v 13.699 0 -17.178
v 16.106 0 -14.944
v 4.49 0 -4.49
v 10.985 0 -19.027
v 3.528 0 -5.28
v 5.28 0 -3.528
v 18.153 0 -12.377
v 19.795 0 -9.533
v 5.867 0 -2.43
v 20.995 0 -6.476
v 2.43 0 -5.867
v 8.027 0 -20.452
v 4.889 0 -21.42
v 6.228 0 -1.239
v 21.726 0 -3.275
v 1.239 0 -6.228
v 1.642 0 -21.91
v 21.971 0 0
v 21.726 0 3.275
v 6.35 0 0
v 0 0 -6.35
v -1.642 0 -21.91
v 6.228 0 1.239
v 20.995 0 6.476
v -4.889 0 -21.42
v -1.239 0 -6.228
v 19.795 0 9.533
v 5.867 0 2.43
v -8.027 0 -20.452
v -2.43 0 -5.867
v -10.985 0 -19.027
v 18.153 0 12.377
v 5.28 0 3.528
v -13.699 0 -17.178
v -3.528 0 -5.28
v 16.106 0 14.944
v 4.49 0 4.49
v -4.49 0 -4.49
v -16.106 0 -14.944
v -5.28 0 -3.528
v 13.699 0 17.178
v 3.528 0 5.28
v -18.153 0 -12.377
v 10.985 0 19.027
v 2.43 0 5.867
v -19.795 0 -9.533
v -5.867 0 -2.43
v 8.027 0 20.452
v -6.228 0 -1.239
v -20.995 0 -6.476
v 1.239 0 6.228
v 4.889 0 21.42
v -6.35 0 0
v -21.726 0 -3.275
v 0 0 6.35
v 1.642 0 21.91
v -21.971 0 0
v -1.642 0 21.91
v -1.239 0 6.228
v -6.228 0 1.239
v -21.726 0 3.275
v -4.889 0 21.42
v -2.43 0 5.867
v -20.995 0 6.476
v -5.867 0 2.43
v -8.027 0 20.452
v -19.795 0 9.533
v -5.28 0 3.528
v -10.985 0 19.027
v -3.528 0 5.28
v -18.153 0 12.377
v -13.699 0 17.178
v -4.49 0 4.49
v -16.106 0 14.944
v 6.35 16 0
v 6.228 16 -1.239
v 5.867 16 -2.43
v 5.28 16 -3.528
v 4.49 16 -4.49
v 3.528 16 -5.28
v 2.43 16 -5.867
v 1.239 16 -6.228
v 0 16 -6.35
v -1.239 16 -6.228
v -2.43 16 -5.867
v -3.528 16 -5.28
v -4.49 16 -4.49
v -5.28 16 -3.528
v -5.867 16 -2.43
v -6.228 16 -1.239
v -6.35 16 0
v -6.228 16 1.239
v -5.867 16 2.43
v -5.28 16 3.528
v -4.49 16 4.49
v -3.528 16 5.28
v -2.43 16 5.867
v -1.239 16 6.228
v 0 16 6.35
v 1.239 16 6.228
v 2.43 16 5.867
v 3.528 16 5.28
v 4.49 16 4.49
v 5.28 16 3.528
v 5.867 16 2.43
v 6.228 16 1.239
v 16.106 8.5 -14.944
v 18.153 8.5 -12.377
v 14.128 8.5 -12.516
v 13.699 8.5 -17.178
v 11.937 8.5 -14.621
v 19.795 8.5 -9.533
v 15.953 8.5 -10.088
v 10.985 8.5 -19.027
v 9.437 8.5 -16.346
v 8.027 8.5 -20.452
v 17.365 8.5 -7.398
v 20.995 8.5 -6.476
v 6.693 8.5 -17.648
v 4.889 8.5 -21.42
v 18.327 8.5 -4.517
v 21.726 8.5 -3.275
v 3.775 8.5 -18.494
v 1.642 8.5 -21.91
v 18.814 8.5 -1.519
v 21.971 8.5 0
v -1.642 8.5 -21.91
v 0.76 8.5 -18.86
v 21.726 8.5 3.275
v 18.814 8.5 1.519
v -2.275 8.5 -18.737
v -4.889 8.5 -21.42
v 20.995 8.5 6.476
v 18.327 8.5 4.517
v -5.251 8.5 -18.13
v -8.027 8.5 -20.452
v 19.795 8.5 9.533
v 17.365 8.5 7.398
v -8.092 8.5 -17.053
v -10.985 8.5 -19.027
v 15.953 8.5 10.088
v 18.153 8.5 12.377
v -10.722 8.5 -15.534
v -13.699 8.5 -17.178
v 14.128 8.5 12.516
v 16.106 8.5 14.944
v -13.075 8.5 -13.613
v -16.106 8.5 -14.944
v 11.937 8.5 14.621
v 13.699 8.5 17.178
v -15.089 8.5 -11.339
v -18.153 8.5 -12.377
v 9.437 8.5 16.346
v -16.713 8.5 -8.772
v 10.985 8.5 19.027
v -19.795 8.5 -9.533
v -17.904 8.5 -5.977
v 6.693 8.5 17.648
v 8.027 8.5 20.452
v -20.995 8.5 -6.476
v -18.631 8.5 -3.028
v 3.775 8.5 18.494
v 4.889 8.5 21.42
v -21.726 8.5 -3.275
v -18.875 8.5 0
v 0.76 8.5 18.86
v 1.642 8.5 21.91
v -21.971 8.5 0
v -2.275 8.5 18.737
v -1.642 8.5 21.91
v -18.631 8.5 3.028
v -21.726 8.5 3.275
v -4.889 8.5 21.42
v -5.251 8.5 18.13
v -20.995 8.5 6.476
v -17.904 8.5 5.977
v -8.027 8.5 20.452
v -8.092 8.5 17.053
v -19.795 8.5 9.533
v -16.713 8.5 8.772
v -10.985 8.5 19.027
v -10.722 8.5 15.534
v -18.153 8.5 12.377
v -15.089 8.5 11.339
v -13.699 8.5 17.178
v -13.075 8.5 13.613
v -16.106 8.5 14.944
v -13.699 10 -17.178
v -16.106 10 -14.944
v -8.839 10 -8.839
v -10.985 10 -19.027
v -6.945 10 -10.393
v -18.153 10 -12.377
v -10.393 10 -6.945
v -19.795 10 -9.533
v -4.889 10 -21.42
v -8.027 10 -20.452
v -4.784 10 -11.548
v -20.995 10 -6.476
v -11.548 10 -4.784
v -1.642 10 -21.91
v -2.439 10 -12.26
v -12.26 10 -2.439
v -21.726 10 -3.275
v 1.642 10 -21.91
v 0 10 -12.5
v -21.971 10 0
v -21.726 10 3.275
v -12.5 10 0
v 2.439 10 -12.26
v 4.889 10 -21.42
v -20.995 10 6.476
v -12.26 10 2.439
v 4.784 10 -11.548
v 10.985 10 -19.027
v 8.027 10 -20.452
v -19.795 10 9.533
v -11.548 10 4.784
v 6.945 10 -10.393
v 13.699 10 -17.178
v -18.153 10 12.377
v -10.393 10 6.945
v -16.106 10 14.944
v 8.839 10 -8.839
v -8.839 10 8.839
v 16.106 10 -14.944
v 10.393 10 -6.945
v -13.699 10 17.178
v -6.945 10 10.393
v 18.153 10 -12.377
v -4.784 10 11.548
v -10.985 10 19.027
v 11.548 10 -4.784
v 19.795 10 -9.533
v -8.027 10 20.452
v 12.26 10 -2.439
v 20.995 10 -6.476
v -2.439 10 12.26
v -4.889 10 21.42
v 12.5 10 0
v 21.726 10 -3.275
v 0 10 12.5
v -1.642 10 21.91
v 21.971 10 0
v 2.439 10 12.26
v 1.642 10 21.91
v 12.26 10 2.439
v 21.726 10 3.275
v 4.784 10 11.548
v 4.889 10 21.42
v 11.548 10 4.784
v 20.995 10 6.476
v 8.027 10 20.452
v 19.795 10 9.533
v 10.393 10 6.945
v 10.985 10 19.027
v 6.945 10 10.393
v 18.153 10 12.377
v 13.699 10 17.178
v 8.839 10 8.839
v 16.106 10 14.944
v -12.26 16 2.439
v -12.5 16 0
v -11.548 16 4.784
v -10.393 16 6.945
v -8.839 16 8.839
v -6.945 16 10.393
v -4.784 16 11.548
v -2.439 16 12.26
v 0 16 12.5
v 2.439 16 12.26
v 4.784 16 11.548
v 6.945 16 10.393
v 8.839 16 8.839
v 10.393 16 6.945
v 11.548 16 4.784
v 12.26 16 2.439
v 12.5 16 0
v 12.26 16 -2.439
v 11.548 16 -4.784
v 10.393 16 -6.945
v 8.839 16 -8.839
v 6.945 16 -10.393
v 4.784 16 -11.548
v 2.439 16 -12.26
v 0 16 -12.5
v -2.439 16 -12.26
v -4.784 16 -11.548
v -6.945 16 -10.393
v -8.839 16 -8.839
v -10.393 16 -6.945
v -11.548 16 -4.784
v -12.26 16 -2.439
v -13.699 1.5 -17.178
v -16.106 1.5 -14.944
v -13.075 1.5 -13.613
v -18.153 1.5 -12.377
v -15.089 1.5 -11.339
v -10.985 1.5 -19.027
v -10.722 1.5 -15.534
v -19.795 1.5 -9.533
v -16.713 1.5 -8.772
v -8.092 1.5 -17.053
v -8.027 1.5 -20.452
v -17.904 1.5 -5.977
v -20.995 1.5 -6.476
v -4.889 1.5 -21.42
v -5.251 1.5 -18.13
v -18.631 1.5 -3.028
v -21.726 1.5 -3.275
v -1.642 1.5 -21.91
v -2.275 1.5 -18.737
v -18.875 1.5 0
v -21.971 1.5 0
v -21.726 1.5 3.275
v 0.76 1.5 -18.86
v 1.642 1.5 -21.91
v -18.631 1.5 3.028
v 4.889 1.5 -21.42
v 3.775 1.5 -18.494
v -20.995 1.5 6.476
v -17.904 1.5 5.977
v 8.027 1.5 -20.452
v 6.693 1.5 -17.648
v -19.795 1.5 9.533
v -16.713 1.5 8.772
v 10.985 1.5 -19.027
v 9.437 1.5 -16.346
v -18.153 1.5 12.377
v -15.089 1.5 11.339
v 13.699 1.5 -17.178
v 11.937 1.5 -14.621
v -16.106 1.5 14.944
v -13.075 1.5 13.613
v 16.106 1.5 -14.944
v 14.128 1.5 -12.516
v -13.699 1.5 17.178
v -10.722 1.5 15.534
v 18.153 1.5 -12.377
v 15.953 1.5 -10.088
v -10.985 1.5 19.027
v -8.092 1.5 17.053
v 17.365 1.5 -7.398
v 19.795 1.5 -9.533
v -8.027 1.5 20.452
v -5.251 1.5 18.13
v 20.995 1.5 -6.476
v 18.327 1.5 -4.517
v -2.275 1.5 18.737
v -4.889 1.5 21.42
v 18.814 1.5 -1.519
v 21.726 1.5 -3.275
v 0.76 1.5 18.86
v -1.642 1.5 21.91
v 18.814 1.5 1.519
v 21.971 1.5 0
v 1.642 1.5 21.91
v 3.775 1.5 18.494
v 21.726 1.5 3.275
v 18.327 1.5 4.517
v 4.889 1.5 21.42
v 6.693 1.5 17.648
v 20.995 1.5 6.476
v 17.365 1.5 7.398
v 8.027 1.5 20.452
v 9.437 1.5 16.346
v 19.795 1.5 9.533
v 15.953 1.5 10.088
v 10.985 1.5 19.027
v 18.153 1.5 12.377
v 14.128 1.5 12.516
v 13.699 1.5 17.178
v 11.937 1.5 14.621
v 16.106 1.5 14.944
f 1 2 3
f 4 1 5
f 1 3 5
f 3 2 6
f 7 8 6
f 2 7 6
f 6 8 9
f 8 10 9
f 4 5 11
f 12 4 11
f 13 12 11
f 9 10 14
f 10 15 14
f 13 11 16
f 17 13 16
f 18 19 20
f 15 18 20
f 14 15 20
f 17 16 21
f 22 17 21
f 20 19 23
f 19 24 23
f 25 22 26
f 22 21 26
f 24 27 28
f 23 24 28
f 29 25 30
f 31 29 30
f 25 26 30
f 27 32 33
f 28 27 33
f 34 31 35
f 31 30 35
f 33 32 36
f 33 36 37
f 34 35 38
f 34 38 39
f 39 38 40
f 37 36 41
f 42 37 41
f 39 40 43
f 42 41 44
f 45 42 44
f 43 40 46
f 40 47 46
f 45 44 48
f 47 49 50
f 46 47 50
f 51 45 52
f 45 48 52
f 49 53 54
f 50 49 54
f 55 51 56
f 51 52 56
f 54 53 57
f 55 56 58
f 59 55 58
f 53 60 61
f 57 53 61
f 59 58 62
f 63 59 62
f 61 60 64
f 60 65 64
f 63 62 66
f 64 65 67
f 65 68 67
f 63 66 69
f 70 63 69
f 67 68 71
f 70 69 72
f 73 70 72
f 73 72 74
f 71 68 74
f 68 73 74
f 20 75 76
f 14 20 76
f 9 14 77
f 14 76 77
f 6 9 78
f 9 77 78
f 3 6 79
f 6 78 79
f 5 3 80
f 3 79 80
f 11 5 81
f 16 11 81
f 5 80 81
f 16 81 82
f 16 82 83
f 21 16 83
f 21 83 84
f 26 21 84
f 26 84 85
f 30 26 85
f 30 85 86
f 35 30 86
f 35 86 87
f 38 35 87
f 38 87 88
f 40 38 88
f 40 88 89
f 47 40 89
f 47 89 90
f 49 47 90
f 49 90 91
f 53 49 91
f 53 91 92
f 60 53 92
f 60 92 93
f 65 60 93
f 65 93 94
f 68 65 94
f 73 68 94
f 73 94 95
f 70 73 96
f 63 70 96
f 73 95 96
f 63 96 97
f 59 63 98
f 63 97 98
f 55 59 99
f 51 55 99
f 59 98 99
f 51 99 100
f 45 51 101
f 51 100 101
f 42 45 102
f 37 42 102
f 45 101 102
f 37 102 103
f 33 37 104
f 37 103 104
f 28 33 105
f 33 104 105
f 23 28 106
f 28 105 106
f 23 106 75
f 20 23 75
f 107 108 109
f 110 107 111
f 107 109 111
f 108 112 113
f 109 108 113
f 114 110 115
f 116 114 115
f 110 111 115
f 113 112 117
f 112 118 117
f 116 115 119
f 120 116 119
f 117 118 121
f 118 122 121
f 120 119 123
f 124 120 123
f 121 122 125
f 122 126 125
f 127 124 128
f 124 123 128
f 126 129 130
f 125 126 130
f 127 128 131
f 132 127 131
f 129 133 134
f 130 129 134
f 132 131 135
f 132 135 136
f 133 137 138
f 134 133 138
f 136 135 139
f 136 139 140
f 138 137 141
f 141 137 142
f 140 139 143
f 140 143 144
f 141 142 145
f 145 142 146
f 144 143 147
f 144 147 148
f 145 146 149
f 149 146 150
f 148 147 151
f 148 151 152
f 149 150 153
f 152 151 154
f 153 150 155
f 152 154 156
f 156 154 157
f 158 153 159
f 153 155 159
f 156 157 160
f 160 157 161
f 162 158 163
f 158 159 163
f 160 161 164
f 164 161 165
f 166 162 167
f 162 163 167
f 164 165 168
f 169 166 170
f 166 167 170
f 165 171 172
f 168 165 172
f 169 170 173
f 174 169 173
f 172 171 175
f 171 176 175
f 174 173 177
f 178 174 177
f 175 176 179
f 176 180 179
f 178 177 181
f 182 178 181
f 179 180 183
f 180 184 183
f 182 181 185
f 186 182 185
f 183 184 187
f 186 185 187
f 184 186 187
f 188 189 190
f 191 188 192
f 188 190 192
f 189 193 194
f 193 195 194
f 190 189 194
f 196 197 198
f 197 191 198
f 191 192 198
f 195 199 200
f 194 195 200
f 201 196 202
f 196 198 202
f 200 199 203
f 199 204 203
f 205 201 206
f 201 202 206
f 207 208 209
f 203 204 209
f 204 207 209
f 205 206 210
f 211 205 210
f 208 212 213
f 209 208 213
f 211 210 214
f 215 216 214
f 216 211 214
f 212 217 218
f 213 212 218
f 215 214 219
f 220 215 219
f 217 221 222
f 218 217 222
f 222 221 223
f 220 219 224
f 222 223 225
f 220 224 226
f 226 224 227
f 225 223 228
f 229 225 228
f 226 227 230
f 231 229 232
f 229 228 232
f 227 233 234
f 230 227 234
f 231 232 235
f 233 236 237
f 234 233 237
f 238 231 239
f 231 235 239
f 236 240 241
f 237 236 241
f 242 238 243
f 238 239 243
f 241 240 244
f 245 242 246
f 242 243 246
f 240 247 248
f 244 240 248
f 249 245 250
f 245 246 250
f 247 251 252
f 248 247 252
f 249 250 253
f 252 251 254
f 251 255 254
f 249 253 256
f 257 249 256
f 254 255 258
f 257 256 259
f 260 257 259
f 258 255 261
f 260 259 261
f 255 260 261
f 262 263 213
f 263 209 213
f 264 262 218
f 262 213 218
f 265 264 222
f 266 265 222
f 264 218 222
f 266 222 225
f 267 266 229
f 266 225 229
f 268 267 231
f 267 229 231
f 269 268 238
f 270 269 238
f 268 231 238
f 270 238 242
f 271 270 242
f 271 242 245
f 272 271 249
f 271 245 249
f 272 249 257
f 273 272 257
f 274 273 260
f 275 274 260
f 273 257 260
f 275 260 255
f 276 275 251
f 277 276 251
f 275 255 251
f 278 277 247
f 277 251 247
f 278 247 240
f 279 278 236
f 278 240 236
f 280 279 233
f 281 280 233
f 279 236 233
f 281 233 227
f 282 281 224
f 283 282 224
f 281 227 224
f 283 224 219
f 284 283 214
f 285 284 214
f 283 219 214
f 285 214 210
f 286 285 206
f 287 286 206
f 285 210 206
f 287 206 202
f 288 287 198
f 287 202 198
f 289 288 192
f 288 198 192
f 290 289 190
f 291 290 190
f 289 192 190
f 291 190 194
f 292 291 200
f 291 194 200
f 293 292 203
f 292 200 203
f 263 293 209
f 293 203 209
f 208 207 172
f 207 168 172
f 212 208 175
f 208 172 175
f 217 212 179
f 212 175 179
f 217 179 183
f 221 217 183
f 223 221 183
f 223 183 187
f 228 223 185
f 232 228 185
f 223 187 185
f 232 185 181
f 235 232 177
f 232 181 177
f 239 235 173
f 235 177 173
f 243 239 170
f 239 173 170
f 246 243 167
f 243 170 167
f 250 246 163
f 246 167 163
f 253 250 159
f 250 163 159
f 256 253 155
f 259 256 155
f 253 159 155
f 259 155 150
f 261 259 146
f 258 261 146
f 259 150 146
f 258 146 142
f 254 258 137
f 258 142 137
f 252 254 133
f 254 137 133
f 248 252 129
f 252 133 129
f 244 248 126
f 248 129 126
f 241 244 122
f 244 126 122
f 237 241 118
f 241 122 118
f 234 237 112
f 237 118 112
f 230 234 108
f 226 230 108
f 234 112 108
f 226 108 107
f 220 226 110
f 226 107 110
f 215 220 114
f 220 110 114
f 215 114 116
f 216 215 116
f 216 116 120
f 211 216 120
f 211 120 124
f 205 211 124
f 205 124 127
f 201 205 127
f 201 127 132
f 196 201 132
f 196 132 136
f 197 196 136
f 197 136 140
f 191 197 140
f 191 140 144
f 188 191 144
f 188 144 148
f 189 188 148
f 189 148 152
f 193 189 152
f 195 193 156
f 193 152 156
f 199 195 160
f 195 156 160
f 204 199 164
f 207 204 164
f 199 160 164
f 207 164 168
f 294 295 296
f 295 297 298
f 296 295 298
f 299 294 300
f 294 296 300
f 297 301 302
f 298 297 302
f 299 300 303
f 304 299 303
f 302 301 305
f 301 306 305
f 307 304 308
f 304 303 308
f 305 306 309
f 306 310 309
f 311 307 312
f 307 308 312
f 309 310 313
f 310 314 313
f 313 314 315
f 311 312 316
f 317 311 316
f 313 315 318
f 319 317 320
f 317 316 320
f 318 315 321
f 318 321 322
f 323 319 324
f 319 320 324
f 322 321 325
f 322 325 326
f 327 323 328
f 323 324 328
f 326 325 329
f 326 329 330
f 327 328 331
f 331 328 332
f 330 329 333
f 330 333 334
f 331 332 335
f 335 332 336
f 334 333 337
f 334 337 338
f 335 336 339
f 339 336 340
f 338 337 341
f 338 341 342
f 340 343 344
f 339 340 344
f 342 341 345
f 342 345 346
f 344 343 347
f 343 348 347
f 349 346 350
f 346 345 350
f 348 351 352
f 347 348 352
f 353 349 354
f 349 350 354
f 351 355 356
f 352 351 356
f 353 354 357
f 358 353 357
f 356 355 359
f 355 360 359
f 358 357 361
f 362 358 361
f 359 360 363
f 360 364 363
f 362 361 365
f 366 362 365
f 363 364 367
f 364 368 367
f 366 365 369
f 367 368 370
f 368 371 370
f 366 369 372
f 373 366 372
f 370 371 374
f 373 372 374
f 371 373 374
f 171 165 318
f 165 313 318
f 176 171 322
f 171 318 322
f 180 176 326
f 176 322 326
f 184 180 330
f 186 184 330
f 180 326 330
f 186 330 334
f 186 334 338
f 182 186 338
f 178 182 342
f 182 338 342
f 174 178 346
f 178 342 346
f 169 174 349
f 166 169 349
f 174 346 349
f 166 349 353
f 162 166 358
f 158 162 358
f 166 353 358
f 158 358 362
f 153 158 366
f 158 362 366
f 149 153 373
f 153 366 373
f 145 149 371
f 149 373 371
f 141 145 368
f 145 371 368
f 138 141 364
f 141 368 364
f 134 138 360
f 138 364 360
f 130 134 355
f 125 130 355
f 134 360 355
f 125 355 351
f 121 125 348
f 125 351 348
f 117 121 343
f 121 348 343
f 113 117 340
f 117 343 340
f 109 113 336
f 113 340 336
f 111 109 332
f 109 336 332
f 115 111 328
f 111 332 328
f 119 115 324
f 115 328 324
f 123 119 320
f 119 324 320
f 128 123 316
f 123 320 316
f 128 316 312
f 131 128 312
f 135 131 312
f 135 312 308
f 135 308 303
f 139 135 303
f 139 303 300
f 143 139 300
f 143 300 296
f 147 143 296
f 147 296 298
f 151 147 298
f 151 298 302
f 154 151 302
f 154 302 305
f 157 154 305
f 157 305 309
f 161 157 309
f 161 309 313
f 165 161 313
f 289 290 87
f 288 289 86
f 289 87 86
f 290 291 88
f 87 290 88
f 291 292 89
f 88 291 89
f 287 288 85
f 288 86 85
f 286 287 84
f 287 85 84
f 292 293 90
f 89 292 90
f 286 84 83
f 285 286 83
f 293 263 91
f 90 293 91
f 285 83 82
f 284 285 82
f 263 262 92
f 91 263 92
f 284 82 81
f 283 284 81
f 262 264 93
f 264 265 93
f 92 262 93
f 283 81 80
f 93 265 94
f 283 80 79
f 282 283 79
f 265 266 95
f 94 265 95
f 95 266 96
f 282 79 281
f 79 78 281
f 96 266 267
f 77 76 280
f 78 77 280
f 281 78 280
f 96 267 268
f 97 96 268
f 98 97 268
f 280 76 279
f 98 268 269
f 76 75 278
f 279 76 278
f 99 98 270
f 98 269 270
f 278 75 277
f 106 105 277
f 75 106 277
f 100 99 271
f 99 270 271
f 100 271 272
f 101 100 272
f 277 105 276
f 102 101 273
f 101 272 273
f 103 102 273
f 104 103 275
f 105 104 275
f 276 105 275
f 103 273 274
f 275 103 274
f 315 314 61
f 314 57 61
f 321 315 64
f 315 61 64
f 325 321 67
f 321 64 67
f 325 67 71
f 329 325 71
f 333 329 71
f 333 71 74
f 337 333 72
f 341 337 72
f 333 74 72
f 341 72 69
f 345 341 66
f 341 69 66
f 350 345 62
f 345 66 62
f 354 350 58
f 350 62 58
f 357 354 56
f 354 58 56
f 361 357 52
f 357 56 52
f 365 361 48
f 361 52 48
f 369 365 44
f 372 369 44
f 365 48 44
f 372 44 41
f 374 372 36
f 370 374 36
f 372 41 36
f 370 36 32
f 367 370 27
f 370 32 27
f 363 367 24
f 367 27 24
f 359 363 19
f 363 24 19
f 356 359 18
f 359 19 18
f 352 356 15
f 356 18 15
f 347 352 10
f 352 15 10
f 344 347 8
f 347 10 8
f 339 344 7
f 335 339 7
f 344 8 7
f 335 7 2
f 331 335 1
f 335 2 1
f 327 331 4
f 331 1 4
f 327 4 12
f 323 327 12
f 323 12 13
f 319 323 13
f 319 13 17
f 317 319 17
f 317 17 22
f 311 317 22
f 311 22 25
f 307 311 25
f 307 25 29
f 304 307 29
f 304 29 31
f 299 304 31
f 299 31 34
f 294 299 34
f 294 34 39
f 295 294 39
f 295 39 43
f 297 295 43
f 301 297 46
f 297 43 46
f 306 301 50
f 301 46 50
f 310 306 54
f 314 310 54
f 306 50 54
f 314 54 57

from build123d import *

# Parameters (mm, degrees)
SKETCH2_R          = 6.35
CUT_EXTRUDE1_DEPTH = 17


with BuildPart() as part:
    # Sketch1 → Revolve1 (revolve)
    with BuildSketch(Plane.XY):
        Polygon((0, 0), (0, 16), (-12.5, 16), (-12.5, 10), (-21.971, 10), (-21.971, 8.5), (-18.875, 8.5), (-18.875, 1.5), (-21.971, 1.5), (-21.971, 0), align=None)
    revolve(axis=Axis((0, 0, 0), (0, 1, 0)))

    # Sketch2 → Cut-Extrude1 (cut, through all)
    with BuildSketch(Plane(origin=(0, 16, 0), x_dir=(1, 0, 0), z_dir=(0, 1, 0))):
        Circle(SKETCH2_R)
    extrude(amount=-CUT_EXTRUDE1_DEPTH, mode=Mode.SUBTRACT)


solid = part.part
